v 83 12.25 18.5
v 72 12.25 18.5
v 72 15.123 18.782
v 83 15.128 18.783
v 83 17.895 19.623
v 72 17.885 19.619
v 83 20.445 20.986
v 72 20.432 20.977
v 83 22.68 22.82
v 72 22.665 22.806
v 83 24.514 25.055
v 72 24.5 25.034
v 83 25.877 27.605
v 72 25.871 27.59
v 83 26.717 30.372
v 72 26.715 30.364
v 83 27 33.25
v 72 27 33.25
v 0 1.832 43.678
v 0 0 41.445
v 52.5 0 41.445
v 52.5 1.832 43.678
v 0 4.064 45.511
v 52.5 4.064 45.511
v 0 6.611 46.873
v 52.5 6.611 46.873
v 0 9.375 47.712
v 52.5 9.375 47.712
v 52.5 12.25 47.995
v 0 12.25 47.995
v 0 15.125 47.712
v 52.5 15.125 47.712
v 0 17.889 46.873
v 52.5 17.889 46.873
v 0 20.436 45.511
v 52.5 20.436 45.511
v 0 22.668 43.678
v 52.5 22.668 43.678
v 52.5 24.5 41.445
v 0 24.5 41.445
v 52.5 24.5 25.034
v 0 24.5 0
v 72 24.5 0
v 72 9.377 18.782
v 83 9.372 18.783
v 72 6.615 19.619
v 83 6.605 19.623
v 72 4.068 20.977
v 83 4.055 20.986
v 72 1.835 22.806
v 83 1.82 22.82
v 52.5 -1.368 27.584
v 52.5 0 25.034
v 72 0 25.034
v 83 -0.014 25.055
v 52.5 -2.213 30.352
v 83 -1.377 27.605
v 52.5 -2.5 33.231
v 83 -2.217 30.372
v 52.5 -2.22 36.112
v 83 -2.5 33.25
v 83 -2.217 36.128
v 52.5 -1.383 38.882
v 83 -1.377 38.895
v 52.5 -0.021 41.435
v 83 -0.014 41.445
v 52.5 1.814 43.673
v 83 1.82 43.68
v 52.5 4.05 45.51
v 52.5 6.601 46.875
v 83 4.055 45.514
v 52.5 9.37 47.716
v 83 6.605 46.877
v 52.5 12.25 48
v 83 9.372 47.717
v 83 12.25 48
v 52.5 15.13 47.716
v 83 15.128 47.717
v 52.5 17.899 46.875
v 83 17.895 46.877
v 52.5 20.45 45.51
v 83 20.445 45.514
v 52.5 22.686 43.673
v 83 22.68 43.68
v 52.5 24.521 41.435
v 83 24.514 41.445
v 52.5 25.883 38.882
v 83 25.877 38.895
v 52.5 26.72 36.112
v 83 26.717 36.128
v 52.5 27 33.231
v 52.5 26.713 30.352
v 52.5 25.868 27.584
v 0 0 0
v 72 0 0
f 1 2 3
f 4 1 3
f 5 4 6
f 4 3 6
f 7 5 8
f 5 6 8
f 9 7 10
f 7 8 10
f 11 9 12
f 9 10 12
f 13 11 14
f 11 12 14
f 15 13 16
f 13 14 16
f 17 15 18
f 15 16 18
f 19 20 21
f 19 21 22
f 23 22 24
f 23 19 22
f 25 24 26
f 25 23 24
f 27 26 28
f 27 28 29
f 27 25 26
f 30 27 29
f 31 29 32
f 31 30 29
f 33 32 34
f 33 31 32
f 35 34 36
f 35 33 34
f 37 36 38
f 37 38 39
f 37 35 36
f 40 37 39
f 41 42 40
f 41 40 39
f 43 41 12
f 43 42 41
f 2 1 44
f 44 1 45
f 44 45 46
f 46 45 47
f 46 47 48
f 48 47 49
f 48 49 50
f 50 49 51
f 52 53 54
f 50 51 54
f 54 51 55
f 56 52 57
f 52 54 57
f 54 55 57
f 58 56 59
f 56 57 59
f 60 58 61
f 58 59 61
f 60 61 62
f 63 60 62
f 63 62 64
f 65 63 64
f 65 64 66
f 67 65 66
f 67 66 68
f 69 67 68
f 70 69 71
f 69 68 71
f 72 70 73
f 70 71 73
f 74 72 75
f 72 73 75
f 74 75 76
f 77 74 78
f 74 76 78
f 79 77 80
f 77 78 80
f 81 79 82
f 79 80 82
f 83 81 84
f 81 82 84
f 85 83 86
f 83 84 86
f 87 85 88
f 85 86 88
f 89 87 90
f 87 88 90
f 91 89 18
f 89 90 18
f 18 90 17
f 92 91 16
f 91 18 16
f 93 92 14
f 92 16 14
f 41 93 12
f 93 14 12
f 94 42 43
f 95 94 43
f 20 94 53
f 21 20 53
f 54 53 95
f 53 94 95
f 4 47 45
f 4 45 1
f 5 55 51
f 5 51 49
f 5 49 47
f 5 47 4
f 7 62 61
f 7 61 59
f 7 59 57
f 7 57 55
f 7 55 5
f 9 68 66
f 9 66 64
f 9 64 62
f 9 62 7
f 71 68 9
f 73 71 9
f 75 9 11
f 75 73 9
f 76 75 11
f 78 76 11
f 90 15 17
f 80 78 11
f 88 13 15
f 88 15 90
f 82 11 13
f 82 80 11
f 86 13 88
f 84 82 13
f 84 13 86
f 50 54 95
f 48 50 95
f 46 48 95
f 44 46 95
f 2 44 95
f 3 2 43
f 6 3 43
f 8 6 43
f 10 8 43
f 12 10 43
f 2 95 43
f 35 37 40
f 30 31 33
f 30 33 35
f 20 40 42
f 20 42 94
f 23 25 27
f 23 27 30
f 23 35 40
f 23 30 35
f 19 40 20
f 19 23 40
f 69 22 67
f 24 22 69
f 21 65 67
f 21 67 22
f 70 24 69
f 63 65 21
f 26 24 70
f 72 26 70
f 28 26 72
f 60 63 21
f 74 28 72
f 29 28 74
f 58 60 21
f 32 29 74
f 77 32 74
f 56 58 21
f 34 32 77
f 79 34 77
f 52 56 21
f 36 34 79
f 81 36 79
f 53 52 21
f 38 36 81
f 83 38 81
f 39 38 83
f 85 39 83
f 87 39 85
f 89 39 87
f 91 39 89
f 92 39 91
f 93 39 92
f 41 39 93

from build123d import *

# Parameters (mm, degrees)
F0_W      = 72
F0_H      = 24.5
F1_DEPTH  = 18.5
F3_DEPTH  = 11
F3_FACE_R = 14.75
F4_DEPTH  = 19.5
F5_W      = 72
F5_H      = 24.5
F6_DEPTH  = 22.945
F8_DEPTH  = 52.5


with BuildPart() as f1:
    # F0 (on Top) → F1 (new body)
    with BuildSketch(Plane.XY):
        with Locations((36, 12.25)):
            Rectangle(F0_W, F0_H)
    extrude(amount=F1_DEPTH)

    # F2 (on face) → F3 (join)
    with BuildSketch(Plane.YZ.offset(72)):
        with BuildLine():
            ThreePointArc((12.25, 18.5), (22.679825, 22.820175), (27, 33.25))
            ThreePointArc((27, 33.25), (1.820175, 43.679825), (12.25, 18.5))
        make_face()
    extrude(amount=F3_DEPTH)



with BuildPart() as f4:
    # F3_face (on face) → F4 (new body)
    with BuildSketch(Plane(origin=(72, 12.25, 33.25), x_dir=(0, 1, 0), z_dir=(-1, 0, 0))):
        Circle(F3_FACE_R)
    extrude(amount=F4_DEPTH)


with BuildPart() as f1_1:
    add(f1.part)

    add(f4.part)  # F6 merges F4
    # F5 (on face) → F6 (join)
    with BuildSketch(Plane.XY.offset(18.5)):
        with Locations((36, 12.25)):
            Rectangle(F5_W, F5_H)
    extrude(amount=F6_DEPTH)

    # F7 (on face) → F8 (join, through all)
    with BuildSketch(Plane(origin=(0, 0, 0), x_dir=(0, -1, 0), z_dir=(-1, 0, 0))):
        with BuildLine():
            Line((-24.5, 41.445), (0, 41.445))
            ThreePointArc((0, 41.445), (-12.25, 47.995), (-24.5, 41.445))
        make_face()
    extrude(amount=-F8_DEPTH)


solid = f1_1.part
